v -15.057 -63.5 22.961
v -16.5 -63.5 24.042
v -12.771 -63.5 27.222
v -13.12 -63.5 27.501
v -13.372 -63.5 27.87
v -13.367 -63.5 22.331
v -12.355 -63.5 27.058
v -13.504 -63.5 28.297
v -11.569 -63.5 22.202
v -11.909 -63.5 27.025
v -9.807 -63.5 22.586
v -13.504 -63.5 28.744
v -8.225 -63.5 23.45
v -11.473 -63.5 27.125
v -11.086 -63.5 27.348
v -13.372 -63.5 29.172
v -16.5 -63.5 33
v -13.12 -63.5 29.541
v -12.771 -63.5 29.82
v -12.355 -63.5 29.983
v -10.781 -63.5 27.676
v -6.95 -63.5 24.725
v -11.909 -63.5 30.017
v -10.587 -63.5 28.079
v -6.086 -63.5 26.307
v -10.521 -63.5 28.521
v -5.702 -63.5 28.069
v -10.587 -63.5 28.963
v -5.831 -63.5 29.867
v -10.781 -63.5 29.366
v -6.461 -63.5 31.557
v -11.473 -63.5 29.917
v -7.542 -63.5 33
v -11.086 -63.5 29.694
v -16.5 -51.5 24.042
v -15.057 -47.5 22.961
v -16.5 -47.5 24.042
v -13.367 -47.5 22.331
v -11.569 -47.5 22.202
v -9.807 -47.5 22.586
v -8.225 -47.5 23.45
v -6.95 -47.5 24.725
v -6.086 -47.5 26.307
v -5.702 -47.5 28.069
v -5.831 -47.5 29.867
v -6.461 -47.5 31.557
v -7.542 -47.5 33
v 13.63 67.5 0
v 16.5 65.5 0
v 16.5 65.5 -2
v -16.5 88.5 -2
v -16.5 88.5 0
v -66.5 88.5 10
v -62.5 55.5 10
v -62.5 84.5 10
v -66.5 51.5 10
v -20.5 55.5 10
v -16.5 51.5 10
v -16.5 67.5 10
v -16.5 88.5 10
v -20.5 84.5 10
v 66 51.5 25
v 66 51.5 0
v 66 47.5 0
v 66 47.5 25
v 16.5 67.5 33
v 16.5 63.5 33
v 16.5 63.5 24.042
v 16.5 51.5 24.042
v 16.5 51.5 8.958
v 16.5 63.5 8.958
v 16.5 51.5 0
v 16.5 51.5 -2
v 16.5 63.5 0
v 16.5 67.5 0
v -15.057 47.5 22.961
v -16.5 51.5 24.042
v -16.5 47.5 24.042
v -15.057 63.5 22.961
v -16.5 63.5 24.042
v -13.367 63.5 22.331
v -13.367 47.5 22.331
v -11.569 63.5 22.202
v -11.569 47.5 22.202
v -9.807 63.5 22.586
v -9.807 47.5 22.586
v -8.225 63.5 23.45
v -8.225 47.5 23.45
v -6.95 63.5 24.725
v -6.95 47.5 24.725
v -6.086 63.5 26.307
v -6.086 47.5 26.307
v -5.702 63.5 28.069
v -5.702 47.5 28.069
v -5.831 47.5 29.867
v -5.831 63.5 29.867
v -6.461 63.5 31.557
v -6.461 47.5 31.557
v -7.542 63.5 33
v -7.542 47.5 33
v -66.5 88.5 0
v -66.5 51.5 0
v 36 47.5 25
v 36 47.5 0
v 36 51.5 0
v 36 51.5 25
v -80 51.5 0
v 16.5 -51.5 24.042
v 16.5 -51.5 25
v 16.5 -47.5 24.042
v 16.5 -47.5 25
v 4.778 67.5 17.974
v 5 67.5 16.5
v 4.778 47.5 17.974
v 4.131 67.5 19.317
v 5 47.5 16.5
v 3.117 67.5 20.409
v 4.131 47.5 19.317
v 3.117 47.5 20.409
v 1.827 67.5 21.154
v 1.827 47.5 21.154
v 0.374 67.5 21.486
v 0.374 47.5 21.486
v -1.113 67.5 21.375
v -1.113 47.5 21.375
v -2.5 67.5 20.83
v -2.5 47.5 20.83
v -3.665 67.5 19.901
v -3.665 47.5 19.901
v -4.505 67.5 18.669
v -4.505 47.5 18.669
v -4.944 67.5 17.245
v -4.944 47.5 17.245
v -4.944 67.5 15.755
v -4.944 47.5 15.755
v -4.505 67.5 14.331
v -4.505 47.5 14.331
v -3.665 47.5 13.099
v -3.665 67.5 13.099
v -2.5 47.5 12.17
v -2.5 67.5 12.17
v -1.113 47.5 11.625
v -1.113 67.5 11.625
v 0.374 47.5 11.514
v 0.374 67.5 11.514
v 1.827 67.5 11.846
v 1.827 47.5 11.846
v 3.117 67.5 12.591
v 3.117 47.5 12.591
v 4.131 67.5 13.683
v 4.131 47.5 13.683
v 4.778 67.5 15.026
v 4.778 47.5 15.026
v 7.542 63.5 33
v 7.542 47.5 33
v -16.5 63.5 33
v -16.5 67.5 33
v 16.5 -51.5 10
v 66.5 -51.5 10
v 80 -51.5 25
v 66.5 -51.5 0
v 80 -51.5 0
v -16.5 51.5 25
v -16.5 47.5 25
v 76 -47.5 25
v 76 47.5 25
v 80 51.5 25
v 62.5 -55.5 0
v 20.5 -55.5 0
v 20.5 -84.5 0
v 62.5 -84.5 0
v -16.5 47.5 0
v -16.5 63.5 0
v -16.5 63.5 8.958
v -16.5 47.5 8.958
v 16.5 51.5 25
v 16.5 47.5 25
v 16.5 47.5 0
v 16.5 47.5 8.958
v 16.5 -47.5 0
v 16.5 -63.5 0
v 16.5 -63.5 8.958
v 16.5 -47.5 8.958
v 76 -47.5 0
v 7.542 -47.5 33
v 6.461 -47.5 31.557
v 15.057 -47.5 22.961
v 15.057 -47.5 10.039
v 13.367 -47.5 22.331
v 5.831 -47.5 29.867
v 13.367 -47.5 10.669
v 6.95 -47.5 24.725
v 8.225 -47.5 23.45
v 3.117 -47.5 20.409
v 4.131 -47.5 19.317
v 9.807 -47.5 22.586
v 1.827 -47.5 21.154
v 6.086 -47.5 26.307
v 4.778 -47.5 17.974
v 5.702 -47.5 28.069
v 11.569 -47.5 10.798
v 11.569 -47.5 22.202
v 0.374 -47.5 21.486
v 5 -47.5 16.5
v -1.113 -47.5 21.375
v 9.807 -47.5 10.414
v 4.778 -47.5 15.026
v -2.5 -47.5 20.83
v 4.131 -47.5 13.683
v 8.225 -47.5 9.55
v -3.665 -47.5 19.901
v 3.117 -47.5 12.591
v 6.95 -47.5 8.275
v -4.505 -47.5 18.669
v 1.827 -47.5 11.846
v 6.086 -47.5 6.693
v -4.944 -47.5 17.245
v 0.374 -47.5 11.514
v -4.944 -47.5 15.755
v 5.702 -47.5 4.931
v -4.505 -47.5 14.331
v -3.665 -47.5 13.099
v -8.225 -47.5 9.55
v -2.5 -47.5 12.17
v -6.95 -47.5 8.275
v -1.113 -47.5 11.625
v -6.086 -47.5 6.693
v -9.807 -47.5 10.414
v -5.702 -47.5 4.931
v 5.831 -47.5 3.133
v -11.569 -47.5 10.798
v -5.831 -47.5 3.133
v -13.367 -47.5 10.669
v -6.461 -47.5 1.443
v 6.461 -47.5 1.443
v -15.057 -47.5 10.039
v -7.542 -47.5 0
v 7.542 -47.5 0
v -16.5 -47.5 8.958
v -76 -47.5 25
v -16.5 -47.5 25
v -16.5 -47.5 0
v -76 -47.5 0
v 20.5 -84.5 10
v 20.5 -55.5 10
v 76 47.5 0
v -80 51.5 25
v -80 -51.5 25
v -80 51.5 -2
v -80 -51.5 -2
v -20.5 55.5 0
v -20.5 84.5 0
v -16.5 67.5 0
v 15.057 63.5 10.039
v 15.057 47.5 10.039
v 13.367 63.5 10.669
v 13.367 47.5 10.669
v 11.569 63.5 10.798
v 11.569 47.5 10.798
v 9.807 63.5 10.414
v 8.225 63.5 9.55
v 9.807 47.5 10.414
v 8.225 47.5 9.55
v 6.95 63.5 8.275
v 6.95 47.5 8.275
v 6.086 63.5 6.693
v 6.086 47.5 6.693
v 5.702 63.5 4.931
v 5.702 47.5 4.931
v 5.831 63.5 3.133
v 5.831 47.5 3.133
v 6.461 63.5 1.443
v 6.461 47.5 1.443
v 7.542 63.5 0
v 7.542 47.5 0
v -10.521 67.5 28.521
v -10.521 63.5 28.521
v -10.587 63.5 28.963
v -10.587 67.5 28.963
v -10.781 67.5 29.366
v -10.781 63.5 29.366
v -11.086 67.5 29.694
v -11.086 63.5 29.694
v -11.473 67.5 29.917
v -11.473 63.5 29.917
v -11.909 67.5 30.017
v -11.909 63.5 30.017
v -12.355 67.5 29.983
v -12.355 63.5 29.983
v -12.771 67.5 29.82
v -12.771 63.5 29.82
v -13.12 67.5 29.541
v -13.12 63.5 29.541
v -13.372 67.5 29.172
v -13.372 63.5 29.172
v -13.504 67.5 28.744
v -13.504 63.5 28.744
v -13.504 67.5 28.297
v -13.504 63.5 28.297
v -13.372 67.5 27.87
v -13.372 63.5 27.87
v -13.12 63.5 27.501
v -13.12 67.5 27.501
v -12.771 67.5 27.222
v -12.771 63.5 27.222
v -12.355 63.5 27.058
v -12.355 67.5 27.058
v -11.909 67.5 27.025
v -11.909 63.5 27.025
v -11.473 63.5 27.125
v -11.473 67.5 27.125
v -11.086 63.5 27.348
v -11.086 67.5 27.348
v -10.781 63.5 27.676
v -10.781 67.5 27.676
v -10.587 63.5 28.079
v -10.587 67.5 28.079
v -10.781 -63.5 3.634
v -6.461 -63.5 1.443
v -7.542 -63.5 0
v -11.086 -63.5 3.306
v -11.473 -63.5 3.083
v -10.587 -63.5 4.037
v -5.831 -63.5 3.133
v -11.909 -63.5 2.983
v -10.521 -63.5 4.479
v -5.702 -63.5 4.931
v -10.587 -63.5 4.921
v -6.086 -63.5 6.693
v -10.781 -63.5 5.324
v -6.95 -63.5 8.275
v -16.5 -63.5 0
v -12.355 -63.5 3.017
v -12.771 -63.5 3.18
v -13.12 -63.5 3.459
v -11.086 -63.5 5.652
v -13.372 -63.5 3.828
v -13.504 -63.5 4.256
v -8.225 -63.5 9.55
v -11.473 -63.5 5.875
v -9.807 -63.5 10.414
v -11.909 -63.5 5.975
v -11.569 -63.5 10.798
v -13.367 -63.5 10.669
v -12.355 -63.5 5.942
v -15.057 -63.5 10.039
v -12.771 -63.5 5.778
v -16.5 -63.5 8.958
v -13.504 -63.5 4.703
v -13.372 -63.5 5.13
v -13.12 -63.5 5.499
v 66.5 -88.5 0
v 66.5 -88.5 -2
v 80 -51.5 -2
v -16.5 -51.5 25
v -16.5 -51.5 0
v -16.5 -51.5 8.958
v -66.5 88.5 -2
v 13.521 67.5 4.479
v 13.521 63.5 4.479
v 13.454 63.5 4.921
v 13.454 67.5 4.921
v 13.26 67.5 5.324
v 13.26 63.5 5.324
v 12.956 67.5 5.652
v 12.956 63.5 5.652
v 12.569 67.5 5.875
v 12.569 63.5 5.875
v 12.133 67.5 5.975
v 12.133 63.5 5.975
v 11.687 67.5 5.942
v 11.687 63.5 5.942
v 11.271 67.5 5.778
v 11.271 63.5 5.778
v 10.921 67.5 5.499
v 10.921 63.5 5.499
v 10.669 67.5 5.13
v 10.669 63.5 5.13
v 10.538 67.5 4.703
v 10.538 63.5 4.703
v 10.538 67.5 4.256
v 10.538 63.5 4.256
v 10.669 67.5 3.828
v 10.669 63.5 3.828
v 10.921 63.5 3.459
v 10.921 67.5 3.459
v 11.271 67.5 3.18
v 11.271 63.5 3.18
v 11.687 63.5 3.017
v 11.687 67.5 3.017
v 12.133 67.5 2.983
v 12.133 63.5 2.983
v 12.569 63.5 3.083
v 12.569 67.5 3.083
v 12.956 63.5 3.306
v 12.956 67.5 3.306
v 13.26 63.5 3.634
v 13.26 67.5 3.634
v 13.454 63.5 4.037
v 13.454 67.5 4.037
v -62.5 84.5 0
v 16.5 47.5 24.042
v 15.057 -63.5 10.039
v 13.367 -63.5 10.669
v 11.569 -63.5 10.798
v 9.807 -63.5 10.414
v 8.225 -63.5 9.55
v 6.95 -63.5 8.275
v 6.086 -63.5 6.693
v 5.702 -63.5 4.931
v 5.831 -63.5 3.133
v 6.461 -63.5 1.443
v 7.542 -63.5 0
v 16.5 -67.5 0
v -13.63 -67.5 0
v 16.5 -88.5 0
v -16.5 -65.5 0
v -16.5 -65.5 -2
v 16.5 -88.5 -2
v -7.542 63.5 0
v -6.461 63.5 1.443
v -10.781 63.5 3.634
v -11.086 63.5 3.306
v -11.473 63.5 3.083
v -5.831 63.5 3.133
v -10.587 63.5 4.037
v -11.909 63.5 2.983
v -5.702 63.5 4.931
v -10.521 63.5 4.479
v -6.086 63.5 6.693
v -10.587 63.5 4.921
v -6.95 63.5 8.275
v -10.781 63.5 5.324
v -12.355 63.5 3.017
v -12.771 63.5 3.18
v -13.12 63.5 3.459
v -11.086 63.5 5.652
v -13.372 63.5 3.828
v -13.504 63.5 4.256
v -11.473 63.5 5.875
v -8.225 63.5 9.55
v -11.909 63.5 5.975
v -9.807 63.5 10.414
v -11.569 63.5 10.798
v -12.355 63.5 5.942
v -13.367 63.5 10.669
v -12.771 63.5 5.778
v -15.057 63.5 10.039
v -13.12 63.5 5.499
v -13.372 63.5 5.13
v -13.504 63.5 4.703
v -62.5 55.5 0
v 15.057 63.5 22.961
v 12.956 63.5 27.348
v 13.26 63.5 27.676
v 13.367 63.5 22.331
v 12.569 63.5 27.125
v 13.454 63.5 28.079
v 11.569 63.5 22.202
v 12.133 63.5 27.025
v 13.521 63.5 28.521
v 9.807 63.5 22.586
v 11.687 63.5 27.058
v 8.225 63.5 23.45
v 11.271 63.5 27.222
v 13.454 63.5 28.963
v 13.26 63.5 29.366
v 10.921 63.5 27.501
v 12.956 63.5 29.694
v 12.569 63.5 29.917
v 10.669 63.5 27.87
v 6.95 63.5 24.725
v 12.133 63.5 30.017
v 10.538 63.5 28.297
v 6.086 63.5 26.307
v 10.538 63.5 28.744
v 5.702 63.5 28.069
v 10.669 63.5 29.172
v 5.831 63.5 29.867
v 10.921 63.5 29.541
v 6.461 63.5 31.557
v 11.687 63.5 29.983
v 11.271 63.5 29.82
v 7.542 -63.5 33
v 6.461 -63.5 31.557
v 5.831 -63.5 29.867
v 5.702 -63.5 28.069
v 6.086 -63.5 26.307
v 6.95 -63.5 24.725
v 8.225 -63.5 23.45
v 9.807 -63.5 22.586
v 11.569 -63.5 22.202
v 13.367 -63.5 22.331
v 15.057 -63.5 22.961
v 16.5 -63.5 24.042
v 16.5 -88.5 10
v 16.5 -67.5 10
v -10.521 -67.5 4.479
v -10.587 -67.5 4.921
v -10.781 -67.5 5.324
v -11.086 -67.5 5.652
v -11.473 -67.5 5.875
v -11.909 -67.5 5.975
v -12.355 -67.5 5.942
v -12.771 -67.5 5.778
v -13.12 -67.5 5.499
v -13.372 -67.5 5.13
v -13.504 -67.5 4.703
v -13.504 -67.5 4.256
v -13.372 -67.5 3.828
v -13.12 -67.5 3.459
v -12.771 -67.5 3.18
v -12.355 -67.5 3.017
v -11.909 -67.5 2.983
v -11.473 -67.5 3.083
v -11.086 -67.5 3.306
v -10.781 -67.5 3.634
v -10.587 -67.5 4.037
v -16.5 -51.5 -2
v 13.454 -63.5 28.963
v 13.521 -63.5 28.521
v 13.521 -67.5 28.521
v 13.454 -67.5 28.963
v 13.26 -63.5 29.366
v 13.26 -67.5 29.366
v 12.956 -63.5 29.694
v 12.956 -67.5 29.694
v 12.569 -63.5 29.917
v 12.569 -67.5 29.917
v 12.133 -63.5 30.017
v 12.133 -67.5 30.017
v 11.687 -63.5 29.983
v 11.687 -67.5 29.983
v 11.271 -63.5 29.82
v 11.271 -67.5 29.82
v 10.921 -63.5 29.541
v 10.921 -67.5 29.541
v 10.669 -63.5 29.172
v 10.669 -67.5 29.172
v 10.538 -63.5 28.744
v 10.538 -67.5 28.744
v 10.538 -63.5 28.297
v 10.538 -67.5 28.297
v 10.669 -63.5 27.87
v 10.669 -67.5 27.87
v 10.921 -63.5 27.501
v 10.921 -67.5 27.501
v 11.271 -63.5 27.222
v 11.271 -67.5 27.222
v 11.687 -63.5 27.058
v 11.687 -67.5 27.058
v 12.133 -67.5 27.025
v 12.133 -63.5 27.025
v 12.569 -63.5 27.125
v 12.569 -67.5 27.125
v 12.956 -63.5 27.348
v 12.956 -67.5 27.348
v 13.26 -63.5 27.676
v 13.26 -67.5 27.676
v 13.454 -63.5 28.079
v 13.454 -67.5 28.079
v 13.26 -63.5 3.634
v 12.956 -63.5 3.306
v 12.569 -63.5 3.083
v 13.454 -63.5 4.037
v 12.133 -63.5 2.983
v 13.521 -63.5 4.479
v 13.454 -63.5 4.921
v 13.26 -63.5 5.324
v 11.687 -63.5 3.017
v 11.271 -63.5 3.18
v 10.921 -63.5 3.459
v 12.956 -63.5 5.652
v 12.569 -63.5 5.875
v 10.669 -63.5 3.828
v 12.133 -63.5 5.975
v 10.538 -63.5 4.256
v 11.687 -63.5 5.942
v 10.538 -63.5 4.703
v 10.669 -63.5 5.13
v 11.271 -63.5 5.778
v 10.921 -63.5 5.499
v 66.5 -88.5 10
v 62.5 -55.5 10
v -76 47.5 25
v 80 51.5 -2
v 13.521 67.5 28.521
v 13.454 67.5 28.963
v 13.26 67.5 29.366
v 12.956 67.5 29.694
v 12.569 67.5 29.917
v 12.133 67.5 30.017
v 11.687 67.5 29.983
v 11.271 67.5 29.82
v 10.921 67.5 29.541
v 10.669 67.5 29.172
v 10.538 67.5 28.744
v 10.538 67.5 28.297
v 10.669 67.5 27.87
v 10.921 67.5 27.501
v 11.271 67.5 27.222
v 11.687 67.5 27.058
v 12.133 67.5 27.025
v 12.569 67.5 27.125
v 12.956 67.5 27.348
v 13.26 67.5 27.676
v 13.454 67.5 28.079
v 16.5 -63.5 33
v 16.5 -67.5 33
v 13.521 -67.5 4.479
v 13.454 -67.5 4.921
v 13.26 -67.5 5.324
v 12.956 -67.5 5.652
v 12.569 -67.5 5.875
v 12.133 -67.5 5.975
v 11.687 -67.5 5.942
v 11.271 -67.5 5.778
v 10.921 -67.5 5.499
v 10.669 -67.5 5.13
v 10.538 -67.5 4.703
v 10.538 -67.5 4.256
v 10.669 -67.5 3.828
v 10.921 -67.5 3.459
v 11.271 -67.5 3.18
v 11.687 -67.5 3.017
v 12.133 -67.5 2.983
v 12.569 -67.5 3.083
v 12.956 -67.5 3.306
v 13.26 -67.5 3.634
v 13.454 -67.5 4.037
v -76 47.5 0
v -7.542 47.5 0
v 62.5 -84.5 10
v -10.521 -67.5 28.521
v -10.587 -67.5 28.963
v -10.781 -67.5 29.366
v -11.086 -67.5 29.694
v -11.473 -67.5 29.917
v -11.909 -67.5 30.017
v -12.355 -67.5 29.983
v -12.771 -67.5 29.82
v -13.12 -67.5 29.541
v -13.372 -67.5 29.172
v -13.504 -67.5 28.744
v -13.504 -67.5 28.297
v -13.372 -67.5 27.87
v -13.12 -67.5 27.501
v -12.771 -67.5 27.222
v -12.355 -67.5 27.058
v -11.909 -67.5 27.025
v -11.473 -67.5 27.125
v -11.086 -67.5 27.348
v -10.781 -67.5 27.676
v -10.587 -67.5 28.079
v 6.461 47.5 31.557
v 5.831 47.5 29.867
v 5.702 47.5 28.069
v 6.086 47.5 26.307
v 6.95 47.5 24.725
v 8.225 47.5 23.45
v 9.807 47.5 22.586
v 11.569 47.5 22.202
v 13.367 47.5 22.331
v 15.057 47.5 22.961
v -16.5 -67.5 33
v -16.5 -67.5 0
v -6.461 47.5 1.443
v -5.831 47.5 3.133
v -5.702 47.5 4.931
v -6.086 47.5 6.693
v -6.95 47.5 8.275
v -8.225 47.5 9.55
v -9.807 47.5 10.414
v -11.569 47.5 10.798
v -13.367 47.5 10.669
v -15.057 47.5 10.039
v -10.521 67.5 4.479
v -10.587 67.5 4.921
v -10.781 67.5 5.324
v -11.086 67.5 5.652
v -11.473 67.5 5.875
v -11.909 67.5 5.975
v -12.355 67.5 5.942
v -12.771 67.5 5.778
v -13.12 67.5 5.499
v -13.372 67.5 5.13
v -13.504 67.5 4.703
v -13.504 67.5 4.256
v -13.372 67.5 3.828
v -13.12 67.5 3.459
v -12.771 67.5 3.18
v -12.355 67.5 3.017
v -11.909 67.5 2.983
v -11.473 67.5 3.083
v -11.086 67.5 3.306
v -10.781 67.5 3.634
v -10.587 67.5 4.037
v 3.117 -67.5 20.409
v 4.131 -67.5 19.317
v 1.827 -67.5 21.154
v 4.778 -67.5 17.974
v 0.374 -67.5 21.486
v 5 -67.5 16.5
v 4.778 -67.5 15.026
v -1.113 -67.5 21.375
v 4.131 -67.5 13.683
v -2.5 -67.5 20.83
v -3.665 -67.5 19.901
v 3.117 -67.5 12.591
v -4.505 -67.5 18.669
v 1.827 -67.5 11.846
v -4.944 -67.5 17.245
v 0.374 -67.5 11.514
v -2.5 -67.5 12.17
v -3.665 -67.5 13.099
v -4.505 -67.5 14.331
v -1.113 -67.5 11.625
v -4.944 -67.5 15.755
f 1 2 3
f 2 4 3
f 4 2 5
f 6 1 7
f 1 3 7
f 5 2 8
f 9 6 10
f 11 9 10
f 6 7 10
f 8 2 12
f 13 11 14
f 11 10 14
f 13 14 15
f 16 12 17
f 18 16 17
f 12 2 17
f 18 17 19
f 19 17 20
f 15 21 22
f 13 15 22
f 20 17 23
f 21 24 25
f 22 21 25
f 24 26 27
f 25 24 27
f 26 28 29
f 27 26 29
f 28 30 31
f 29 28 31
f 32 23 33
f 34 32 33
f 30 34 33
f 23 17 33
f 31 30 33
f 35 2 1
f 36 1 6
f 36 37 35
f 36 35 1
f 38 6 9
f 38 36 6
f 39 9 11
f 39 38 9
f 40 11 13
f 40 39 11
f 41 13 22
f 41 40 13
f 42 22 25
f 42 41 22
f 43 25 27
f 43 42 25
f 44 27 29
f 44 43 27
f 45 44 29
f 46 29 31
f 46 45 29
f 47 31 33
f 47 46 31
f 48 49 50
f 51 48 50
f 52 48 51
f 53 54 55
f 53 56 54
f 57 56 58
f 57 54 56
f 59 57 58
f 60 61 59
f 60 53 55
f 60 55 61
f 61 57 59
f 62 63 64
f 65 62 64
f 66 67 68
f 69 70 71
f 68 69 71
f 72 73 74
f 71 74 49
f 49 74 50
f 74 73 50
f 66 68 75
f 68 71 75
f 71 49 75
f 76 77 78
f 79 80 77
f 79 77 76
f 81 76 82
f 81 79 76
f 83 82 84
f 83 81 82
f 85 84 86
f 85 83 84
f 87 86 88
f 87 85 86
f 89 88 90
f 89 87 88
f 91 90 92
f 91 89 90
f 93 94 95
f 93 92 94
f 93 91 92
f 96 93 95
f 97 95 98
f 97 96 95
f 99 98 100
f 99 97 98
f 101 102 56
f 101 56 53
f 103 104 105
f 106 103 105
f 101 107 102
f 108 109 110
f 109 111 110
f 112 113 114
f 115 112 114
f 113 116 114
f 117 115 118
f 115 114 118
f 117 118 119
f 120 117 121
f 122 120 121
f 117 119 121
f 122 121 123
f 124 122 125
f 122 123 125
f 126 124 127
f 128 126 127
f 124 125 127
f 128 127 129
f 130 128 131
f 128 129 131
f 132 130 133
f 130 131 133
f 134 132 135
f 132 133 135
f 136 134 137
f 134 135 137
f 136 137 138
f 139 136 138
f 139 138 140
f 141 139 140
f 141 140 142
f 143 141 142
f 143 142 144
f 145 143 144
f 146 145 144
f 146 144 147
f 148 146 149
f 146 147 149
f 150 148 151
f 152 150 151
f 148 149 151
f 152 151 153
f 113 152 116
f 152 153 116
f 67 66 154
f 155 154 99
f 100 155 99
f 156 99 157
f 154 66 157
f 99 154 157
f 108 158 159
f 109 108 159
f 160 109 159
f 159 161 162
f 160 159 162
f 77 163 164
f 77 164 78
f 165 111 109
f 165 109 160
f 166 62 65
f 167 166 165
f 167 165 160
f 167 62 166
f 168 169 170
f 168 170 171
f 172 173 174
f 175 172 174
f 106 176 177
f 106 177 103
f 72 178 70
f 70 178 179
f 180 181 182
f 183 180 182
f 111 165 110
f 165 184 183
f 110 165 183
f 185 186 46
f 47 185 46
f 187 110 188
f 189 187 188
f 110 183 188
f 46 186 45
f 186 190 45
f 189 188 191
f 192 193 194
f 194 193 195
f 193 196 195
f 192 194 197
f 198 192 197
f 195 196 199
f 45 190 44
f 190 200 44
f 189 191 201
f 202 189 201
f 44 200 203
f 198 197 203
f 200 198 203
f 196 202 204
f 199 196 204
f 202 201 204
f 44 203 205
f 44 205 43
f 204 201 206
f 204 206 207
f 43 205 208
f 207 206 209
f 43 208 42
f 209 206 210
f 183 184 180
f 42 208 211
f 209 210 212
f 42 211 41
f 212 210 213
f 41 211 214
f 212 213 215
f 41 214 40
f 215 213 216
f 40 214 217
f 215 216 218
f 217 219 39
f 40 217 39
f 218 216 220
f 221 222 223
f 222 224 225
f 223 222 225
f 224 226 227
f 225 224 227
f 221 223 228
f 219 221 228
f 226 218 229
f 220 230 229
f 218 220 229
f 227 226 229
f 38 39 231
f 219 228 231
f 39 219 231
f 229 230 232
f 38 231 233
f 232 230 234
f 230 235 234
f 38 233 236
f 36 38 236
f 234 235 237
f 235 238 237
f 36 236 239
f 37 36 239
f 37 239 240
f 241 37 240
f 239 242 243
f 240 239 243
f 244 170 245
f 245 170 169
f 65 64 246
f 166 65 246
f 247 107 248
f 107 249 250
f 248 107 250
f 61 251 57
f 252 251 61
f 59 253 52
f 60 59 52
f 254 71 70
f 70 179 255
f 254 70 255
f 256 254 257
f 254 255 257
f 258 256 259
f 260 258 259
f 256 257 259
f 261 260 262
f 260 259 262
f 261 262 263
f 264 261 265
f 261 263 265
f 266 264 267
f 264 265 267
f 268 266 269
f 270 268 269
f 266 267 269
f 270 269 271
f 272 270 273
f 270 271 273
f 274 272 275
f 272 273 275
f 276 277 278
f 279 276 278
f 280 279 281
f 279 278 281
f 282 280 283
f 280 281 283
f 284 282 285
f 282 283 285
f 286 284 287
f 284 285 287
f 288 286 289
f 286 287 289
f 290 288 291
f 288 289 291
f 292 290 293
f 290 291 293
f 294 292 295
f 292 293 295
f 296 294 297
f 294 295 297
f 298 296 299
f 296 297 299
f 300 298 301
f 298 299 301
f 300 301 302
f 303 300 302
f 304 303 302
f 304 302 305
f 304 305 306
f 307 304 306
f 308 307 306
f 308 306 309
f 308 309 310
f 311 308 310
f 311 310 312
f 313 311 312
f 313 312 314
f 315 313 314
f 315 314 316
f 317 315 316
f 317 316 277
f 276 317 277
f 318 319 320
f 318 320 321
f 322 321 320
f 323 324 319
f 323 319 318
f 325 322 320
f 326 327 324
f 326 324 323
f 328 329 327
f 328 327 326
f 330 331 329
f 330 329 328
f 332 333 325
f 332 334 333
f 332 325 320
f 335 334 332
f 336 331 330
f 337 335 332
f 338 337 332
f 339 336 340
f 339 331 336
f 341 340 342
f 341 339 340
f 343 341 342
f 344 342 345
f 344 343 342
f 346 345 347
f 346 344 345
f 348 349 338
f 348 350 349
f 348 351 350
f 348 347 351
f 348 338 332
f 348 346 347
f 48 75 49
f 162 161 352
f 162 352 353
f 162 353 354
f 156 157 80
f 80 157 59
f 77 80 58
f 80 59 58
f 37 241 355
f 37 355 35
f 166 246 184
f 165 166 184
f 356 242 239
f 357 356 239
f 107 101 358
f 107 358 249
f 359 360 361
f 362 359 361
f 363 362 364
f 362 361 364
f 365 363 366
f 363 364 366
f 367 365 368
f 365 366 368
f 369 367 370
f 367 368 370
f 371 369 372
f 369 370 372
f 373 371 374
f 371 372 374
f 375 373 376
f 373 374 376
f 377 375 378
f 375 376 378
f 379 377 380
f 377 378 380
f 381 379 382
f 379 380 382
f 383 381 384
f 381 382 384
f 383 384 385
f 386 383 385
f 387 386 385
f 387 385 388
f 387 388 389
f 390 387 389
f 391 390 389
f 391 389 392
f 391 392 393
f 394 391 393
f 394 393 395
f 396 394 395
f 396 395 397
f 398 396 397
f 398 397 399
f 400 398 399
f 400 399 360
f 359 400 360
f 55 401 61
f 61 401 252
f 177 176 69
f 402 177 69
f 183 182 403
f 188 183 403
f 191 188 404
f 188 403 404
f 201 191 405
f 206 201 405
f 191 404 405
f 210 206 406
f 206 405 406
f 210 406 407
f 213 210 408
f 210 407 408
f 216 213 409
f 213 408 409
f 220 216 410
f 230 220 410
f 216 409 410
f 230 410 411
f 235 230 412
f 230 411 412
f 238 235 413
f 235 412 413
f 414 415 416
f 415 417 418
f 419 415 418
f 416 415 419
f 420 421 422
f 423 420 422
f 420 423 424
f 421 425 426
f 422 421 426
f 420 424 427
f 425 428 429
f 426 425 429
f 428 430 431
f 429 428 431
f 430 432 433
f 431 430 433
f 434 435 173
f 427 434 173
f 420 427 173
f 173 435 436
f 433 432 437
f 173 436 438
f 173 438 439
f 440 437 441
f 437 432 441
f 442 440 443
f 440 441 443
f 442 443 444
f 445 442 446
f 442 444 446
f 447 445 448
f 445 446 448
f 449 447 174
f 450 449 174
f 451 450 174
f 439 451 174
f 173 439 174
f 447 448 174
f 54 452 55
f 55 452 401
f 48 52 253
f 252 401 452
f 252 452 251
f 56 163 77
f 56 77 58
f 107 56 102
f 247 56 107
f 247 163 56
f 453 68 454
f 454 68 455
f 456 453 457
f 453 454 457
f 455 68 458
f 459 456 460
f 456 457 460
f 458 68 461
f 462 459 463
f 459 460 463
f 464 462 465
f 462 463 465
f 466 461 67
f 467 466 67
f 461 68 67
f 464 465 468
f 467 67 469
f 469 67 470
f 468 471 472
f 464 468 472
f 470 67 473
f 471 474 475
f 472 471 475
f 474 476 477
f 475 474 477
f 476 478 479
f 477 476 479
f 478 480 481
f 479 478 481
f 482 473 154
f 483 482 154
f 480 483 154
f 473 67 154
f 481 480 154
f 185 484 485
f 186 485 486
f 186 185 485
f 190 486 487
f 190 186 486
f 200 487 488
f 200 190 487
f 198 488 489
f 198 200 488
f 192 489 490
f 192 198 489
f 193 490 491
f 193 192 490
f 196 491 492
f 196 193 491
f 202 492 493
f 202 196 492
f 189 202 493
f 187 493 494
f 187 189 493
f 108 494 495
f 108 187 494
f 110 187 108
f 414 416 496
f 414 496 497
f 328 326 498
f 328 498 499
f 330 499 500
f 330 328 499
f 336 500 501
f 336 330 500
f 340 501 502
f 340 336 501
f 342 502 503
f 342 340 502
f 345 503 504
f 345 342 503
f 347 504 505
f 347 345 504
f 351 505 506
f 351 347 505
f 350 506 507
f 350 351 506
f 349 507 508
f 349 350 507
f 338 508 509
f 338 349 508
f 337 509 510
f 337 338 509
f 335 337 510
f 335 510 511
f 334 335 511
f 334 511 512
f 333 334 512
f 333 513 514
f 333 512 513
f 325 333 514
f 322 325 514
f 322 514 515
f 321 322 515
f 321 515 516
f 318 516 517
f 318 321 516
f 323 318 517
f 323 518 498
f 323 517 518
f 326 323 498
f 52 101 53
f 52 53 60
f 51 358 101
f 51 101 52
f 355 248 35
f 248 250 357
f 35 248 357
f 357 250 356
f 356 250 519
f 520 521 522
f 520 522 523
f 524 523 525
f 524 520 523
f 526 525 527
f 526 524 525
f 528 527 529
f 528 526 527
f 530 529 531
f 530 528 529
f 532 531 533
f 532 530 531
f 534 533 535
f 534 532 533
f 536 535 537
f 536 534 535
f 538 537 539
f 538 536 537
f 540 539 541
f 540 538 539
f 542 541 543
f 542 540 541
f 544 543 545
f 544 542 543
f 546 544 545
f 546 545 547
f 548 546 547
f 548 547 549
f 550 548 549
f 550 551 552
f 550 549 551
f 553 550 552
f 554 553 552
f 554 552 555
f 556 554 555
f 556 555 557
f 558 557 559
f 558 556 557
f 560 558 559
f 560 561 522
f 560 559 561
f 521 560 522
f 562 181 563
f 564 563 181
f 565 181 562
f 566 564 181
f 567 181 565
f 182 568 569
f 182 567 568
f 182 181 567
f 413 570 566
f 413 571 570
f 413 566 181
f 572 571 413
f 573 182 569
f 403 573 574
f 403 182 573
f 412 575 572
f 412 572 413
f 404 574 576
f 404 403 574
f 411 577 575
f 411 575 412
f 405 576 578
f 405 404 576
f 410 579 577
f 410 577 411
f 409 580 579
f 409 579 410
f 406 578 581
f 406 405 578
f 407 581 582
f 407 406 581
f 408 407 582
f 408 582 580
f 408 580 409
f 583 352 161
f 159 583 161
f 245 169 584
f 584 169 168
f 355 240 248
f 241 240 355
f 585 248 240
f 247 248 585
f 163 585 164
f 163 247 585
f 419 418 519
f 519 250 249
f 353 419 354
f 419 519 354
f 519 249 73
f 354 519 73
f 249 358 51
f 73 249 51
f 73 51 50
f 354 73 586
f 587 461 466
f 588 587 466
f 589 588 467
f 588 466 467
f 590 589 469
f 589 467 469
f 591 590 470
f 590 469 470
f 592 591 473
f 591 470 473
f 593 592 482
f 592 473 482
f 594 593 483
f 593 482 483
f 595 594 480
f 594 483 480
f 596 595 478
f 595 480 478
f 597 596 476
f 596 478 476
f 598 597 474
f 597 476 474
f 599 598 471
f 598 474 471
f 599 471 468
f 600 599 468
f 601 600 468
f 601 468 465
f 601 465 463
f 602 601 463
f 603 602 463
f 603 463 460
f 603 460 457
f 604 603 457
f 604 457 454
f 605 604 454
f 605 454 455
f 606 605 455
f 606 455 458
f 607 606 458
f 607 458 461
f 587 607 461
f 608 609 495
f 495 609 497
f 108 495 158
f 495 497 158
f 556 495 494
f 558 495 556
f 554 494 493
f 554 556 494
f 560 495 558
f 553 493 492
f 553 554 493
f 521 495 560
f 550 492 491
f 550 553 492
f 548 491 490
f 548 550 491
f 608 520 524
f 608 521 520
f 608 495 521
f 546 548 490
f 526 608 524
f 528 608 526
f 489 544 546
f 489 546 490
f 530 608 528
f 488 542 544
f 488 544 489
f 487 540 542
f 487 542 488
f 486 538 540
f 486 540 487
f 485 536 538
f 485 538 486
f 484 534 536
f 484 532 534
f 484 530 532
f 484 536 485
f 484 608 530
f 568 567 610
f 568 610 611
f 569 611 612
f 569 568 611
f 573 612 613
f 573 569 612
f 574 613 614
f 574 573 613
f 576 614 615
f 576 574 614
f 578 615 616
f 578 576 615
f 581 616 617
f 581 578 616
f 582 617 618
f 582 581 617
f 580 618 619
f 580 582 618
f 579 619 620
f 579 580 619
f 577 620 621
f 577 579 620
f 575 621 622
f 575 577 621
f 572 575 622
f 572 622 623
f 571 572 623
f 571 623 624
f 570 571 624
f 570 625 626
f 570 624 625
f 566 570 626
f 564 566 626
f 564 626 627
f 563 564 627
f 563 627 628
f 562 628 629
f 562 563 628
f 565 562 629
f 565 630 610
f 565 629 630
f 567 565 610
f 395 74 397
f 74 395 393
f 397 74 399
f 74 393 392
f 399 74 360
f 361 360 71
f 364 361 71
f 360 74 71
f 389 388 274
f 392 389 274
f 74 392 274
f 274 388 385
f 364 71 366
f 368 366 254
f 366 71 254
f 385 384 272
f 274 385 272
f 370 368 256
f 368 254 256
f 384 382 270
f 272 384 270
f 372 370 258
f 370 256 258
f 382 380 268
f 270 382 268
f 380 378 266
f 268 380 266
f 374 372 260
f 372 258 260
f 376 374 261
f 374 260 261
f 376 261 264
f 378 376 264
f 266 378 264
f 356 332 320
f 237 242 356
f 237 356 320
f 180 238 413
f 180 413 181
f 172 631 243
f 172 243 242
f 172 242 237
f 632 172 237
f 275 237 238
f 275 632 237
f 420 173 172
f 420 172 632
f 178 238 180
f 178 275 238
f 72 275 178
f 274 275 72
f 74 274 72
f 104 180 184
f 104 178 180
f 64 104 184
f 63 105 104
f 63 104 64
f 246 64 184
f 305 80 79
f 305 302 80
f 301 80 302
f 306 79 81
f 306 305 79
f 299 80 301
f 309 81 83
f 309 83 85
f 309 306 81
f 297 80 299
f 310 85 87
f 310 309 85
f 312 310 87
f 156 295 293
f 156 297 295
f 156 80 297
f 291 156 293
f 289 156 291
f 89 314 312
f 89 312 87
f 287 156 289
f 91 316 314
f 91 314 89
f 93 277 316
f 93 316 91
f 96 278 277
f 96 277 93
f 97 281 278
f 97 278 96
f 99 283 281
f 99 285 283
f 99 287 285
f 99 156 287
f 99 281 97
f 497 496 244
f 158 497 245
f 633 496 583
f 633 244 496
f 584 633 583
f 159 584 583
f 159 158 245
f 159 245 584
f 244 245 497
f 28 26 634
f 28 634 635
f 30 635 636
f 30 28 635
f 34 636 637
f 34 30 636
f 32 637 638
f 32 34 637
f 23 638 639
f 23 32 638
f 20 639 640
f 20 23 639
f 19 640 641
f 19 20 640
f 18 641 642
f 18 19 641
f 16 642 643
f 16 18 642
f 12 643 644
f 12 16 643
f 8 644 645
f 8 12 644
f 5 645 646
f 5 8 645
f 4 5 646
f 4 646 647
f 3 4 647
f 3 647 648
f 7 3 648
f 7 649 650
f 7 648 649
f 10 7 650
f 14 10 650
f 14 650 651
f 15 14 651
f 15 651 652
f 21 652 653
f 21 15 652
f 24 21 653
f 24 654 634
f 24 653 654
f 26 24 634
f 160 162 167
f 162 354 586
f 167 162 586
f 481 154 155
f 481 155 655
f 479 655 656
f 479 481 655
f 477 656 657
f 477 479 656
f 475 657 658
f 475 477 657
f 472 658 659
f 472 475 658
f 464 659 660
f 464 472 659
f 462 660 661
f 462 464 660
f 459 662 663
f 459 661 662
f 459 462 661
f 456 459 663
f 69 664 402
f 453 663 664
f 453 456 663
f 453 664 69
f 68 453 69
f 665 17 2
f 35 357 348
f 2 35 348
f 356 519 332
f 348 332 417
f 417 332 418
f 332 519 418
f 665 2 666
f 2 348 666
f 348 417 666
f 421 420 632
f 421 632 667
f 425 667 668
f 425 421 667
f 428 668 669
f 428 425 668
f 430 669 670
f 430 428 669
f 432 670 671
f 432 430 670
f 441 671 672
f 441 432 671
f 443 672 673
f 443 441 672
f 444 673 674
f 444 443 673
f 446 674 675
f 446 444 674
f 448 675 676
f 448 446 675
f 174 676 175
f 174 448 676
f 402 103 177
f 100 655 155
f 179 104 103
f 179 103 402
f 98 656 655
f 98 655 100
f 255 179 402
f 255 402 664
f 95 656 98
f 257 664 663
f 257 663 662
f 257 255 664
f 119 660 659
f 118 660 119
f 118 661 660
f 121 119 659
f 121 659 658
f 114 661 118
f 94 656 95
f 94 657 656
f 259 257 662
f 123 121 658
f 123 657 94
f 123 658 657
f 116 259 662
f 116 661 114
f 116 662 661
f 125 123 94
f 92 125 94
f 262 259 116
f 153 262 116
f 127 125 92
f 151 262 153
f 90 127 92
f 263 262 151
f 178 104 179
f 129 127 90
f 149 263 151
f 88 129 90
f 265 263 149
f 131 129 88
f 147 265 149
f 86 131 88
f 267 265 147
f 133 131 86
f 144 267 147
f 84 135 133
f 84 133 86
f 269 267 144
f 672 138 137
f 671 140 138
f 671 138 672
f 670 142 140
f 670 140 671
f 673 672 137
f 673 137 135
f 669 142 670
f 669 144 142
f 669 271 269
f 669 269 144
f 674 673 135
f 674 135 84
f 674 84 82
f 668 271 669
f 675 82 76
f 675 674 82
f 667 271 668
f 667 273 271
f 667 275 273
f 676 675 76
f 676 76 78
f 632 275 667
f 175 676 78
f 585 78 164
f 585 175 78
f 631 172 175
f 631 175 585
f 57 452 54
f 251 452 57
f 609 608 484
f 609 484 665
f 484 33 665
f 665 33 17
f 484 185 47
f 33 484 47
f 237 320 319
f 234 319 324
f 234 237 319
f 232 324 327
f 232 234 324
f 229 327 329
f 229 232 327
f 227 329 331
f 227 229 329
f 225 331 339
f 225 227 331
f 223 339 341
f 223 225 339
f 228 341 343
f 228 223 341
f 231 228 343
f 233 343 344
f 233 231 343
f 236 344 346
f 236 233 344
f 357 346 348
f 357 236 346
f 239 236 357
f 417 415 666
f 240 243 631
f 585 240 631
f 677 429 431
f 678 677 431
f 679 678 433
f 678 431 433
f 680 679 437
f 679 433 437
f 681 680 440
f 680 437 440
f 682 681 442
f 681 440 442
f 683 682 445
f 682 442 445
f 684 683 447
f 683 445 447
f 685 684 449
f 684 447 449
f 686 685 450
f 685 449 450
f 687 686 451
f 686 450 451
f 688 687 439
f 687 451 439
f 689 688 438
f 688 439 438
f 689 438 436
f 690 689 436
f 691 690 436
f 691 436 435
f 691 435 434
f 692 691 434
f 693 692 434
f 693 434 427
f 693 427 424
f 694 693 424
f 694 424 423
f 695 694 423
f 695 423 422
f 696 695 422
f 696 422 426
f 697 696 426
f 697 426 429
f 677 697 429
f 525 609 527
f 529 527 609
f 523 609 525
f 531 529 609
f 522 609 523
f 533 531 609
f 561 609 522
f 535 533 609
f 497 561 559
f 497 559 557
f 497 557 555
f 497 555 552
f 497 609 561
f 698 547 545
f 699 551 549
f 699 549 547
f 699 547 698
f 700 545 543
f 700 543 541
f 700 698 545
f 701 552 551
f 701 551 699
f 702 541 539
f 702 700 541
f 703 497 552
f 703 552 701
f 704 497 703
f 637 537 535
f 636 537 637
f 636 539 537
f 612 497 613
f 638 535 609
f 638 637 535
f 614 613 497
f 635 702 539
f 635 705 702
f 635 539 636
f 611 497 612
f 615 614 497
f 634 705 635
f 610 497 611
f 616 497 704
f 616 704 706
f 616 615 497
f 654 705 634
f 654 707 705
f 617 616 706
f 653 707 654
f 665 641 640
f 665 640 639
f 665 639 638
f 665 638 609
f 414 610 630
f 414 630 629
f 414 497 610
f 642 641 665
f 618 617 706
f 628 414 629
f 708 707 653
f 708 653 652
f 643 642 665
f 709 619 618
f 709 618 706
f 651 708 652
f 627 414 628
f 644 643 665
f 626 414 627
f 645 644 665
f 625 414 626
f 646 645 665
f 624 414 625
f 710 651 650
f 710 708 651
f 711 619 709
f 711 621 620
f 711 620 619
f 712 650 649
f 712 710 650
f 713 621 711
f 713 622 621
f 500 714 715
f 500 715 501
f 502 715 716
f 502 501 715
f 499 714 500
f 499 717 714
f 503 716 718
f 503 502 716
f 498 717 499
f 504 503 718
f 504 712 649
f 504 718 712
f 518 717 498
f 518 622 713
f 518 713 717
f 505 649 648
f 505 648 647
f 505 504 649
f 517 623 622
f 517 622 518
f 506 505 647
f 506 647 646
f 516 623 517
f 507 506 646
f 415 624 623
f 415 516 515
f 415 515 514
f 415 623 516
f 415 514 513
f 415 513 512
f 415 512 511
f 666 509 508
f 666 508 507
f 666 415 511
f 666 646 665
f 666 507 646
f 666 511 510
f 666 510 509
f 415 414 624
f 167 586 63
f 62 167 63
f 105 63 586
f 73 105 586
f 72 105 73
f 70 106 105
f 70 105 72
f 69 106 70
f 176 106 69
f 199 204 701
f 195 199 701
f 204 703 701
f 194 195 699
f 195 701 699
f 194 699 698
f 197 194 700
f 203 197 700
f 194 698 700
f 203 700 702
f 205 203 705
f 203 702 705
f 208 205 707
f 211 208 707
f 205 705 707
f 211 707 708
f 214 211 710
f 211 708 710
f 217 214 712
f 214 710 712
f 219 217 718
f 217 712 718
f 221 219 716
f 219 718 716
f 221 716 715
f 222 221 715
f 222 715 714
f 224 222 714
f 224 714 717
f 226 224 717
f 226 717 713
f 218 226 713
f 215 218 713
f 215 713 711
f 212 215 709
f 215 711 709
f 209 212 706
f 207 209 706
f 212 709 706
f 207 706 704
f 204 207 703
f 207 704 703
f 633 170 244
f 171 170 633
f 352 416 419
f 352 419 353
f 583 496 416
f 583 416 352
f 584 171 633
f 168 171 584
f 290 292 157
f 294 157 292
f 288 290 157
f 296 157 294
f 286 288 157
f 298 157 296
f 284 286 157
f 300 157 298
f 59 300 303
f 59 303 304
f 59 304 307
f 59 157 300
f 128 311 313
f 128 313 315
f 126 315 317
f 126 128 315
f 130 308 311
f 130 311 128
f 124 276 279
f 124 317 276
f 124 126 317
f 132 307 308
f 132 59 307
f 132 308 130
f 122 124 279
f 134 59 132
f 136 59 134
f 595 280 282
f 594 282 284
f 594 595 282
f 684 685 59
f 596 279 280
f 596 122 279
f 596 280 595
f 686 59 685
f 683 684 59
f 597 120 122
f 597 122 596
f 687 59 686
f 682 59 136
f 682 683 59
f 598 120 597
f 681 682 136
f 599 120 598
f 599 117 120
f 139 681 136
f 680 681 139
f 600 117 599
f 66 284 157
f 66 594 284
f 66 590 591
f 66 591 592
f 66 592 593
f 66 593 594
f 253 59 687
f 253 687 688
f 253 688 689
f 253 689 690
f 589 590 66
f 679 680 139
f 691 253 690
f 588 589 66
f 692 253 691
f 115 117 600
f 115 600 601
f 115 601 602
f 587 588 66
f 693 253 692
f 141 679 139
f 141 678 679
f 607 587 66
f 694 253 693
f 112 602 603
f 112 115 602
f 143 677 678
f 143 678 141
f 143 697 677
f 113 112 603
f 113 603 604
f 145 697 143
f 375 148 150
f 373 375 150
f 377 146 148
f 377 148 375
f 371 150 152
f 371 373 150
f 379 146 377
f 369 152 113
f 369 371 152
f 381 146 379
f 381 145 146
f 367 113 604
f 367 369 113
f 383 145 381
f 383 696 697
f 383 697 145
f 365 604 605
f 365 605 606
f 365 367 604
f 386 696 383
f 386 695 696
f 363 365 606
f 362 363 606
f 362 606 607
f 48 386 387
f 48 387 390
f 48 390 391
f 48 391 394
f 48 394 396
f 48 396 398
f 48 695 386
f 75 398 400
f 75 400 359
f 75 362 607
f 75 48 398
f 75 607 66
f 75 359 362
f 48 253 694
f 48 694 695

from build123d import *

# Parameters (mm, degrees)
PAD027_DEPTH    = 2
PAD028_DEPTH    = 25
PAD029_DEPTH    = 33
SKETCH050_R     = 1.5
SKETCH050_R_2   = 5
POCKET020_DEPTH = 101.5
SKETCH051_W     = 50
SKETCH051_H     = 37
SKETCH051_W_2   = 42
SKETCH051_H_2   = 29
PAD030_DEPTH    = 10
POCKET021_DEPTH = 63.5


with BuildPart() as part:
    # Sketch046 → Pad027 (new body)
    with BuildSketch(Plane.XY):
        Polygon((16.5, 65.5), (-16.5, 88.5), (-66.5, 88.5), (-80, 51.5), (-80, -51.5), (-16.5, -51.5), (-16.5, -65.5), (16.5, -88.5), (66.5, -88.5), (80, -51.5), (80, 51.5), (16.5, 51.5), align=None)
    extrude(amount=-PAD027_DEPTH)

    # Sketch047 → Pad028 (join)
    with BuildSketch(Plane.XY):
        Polygon((76, 47.5), (76, -47.5), (15.5, -47.5), (-15.5, -47.5), (-76, -47.5), (-76, 47.5), (-15.5, 47.5), (15.5, 47.5), (36, 47.5), (36, 51.5), (15.5, 51.5), (-15.5, 51.5), (-80, 51.5), (-80, -51.5), (-15.5, -51.5), (15.5, -51.5), (80, -51.5), (80, 51.5), (66, 51.5), (66, 47.5), align=None)
    extrude(amount=PAD028_DEPTH)

    # Sketch048 (on Face7 of Pad028) → Pad029 (join)
    with BuildSketch(Plane.XY):
        Polygon((-16.5, 67.5), (16.5, 67.5), (16.5, 51.5), (16.5, 47.5), (-16.5, 47.5), (-16.5, 51.5), align=None)
        Polygon((16.5, -51.5), (16.5, -67.5), (-16.5, -67.5), (-16.5, -51.5), (-16.5, -47.5), (16.5, -47.5), align=None)
    extrude(amount=PAD029_DEPTH)

    # Sketch050 → Pocket020 (cut, symmetric)
    with BuildSketch(Plane.XZ):
        with Locations((-12.020815, 4.479185)):
            Circle(SKETCH050_R)
        with Locations((12.020815, 28.520815)):
            Circle(SKETCH050_R)
        with Locations((-12.020815, 28.520815)):
            Circle(SKETCH050_R)
        with Locations((12.020815, 4.479185)):
            Circle(SKETCH050_R)
        with Locations((0, 16.5)):
            Circle(SKETCH050_R_2)
    extrude(amount=POCKET020_DEPTH, both=True, mode=Mode.SUBTRACT)

    # Sketch051 → Pad030 (join)
    with BuildSketch(Plane.XY):
        with Locations((-41.5, 70)):
            Rectangle(SKETCH051_W, SKETCH051_H)
        with Locations((-41.5, 70)):
            Rectangle(SKETCH051_W_2, SKETCH051_H_2, mode=Mode.SUBTRACT)
        with Locations((41.5, -70)):
            Rectangle(SKETCH051_W, SKETCH051_H)
        with Locations((41.5, -70)):
            Rectangle(SKETCH051_W_2, SKETCH051_H_2, mode=Mode.SUBTRACT)
    extrude(amount=PAD030_DEPTH)

    # Sketch058 → Pocket021 (cut, symmetric)
    with BuildSketch(Plane.XZ):
        with BuildLine():
            Line((-16.5, 33), (-16.5, 24.041631))
            ThreePointArc((-16.5, 24.041631), (-7.541631, 24.041631), (-7.541631, 33))
            Line((-16.5, 33), (-7.541631, 33))
        make_face()
        with BuildLine():
            Line((16.5, 33), (16.5, 24.041631))
            ThreePointArc((7.541631, 33), (7.541631, 24.041631), (16.5, 24.041631))
            Line((16.5, 33), (7.541631, 33))
        make_face()
        with BuildLine():
            Line((-16.5, 0), (-16.5, 8.958369))
            ThreePointArc((-7.541631, 0), (-7.541631, 8.958369), (-16.5, 8.958369))
            Line((-16.5, 0), (-7.541631, 0))
        make_face()
        with BuildLine():
            Line((16.5, 0), (7.541631, 0))
            ThreePointArc((16.5, 8.958369), (7.541631, 8.958369), (7.541631, 0))
            Line((16.5, 0), (16.5, 8.958369))
        make_face()
    extrude(amount=POCKET021_DEPTH, both=True, mode=Mode.SUBTRACT)


solid = part.part
